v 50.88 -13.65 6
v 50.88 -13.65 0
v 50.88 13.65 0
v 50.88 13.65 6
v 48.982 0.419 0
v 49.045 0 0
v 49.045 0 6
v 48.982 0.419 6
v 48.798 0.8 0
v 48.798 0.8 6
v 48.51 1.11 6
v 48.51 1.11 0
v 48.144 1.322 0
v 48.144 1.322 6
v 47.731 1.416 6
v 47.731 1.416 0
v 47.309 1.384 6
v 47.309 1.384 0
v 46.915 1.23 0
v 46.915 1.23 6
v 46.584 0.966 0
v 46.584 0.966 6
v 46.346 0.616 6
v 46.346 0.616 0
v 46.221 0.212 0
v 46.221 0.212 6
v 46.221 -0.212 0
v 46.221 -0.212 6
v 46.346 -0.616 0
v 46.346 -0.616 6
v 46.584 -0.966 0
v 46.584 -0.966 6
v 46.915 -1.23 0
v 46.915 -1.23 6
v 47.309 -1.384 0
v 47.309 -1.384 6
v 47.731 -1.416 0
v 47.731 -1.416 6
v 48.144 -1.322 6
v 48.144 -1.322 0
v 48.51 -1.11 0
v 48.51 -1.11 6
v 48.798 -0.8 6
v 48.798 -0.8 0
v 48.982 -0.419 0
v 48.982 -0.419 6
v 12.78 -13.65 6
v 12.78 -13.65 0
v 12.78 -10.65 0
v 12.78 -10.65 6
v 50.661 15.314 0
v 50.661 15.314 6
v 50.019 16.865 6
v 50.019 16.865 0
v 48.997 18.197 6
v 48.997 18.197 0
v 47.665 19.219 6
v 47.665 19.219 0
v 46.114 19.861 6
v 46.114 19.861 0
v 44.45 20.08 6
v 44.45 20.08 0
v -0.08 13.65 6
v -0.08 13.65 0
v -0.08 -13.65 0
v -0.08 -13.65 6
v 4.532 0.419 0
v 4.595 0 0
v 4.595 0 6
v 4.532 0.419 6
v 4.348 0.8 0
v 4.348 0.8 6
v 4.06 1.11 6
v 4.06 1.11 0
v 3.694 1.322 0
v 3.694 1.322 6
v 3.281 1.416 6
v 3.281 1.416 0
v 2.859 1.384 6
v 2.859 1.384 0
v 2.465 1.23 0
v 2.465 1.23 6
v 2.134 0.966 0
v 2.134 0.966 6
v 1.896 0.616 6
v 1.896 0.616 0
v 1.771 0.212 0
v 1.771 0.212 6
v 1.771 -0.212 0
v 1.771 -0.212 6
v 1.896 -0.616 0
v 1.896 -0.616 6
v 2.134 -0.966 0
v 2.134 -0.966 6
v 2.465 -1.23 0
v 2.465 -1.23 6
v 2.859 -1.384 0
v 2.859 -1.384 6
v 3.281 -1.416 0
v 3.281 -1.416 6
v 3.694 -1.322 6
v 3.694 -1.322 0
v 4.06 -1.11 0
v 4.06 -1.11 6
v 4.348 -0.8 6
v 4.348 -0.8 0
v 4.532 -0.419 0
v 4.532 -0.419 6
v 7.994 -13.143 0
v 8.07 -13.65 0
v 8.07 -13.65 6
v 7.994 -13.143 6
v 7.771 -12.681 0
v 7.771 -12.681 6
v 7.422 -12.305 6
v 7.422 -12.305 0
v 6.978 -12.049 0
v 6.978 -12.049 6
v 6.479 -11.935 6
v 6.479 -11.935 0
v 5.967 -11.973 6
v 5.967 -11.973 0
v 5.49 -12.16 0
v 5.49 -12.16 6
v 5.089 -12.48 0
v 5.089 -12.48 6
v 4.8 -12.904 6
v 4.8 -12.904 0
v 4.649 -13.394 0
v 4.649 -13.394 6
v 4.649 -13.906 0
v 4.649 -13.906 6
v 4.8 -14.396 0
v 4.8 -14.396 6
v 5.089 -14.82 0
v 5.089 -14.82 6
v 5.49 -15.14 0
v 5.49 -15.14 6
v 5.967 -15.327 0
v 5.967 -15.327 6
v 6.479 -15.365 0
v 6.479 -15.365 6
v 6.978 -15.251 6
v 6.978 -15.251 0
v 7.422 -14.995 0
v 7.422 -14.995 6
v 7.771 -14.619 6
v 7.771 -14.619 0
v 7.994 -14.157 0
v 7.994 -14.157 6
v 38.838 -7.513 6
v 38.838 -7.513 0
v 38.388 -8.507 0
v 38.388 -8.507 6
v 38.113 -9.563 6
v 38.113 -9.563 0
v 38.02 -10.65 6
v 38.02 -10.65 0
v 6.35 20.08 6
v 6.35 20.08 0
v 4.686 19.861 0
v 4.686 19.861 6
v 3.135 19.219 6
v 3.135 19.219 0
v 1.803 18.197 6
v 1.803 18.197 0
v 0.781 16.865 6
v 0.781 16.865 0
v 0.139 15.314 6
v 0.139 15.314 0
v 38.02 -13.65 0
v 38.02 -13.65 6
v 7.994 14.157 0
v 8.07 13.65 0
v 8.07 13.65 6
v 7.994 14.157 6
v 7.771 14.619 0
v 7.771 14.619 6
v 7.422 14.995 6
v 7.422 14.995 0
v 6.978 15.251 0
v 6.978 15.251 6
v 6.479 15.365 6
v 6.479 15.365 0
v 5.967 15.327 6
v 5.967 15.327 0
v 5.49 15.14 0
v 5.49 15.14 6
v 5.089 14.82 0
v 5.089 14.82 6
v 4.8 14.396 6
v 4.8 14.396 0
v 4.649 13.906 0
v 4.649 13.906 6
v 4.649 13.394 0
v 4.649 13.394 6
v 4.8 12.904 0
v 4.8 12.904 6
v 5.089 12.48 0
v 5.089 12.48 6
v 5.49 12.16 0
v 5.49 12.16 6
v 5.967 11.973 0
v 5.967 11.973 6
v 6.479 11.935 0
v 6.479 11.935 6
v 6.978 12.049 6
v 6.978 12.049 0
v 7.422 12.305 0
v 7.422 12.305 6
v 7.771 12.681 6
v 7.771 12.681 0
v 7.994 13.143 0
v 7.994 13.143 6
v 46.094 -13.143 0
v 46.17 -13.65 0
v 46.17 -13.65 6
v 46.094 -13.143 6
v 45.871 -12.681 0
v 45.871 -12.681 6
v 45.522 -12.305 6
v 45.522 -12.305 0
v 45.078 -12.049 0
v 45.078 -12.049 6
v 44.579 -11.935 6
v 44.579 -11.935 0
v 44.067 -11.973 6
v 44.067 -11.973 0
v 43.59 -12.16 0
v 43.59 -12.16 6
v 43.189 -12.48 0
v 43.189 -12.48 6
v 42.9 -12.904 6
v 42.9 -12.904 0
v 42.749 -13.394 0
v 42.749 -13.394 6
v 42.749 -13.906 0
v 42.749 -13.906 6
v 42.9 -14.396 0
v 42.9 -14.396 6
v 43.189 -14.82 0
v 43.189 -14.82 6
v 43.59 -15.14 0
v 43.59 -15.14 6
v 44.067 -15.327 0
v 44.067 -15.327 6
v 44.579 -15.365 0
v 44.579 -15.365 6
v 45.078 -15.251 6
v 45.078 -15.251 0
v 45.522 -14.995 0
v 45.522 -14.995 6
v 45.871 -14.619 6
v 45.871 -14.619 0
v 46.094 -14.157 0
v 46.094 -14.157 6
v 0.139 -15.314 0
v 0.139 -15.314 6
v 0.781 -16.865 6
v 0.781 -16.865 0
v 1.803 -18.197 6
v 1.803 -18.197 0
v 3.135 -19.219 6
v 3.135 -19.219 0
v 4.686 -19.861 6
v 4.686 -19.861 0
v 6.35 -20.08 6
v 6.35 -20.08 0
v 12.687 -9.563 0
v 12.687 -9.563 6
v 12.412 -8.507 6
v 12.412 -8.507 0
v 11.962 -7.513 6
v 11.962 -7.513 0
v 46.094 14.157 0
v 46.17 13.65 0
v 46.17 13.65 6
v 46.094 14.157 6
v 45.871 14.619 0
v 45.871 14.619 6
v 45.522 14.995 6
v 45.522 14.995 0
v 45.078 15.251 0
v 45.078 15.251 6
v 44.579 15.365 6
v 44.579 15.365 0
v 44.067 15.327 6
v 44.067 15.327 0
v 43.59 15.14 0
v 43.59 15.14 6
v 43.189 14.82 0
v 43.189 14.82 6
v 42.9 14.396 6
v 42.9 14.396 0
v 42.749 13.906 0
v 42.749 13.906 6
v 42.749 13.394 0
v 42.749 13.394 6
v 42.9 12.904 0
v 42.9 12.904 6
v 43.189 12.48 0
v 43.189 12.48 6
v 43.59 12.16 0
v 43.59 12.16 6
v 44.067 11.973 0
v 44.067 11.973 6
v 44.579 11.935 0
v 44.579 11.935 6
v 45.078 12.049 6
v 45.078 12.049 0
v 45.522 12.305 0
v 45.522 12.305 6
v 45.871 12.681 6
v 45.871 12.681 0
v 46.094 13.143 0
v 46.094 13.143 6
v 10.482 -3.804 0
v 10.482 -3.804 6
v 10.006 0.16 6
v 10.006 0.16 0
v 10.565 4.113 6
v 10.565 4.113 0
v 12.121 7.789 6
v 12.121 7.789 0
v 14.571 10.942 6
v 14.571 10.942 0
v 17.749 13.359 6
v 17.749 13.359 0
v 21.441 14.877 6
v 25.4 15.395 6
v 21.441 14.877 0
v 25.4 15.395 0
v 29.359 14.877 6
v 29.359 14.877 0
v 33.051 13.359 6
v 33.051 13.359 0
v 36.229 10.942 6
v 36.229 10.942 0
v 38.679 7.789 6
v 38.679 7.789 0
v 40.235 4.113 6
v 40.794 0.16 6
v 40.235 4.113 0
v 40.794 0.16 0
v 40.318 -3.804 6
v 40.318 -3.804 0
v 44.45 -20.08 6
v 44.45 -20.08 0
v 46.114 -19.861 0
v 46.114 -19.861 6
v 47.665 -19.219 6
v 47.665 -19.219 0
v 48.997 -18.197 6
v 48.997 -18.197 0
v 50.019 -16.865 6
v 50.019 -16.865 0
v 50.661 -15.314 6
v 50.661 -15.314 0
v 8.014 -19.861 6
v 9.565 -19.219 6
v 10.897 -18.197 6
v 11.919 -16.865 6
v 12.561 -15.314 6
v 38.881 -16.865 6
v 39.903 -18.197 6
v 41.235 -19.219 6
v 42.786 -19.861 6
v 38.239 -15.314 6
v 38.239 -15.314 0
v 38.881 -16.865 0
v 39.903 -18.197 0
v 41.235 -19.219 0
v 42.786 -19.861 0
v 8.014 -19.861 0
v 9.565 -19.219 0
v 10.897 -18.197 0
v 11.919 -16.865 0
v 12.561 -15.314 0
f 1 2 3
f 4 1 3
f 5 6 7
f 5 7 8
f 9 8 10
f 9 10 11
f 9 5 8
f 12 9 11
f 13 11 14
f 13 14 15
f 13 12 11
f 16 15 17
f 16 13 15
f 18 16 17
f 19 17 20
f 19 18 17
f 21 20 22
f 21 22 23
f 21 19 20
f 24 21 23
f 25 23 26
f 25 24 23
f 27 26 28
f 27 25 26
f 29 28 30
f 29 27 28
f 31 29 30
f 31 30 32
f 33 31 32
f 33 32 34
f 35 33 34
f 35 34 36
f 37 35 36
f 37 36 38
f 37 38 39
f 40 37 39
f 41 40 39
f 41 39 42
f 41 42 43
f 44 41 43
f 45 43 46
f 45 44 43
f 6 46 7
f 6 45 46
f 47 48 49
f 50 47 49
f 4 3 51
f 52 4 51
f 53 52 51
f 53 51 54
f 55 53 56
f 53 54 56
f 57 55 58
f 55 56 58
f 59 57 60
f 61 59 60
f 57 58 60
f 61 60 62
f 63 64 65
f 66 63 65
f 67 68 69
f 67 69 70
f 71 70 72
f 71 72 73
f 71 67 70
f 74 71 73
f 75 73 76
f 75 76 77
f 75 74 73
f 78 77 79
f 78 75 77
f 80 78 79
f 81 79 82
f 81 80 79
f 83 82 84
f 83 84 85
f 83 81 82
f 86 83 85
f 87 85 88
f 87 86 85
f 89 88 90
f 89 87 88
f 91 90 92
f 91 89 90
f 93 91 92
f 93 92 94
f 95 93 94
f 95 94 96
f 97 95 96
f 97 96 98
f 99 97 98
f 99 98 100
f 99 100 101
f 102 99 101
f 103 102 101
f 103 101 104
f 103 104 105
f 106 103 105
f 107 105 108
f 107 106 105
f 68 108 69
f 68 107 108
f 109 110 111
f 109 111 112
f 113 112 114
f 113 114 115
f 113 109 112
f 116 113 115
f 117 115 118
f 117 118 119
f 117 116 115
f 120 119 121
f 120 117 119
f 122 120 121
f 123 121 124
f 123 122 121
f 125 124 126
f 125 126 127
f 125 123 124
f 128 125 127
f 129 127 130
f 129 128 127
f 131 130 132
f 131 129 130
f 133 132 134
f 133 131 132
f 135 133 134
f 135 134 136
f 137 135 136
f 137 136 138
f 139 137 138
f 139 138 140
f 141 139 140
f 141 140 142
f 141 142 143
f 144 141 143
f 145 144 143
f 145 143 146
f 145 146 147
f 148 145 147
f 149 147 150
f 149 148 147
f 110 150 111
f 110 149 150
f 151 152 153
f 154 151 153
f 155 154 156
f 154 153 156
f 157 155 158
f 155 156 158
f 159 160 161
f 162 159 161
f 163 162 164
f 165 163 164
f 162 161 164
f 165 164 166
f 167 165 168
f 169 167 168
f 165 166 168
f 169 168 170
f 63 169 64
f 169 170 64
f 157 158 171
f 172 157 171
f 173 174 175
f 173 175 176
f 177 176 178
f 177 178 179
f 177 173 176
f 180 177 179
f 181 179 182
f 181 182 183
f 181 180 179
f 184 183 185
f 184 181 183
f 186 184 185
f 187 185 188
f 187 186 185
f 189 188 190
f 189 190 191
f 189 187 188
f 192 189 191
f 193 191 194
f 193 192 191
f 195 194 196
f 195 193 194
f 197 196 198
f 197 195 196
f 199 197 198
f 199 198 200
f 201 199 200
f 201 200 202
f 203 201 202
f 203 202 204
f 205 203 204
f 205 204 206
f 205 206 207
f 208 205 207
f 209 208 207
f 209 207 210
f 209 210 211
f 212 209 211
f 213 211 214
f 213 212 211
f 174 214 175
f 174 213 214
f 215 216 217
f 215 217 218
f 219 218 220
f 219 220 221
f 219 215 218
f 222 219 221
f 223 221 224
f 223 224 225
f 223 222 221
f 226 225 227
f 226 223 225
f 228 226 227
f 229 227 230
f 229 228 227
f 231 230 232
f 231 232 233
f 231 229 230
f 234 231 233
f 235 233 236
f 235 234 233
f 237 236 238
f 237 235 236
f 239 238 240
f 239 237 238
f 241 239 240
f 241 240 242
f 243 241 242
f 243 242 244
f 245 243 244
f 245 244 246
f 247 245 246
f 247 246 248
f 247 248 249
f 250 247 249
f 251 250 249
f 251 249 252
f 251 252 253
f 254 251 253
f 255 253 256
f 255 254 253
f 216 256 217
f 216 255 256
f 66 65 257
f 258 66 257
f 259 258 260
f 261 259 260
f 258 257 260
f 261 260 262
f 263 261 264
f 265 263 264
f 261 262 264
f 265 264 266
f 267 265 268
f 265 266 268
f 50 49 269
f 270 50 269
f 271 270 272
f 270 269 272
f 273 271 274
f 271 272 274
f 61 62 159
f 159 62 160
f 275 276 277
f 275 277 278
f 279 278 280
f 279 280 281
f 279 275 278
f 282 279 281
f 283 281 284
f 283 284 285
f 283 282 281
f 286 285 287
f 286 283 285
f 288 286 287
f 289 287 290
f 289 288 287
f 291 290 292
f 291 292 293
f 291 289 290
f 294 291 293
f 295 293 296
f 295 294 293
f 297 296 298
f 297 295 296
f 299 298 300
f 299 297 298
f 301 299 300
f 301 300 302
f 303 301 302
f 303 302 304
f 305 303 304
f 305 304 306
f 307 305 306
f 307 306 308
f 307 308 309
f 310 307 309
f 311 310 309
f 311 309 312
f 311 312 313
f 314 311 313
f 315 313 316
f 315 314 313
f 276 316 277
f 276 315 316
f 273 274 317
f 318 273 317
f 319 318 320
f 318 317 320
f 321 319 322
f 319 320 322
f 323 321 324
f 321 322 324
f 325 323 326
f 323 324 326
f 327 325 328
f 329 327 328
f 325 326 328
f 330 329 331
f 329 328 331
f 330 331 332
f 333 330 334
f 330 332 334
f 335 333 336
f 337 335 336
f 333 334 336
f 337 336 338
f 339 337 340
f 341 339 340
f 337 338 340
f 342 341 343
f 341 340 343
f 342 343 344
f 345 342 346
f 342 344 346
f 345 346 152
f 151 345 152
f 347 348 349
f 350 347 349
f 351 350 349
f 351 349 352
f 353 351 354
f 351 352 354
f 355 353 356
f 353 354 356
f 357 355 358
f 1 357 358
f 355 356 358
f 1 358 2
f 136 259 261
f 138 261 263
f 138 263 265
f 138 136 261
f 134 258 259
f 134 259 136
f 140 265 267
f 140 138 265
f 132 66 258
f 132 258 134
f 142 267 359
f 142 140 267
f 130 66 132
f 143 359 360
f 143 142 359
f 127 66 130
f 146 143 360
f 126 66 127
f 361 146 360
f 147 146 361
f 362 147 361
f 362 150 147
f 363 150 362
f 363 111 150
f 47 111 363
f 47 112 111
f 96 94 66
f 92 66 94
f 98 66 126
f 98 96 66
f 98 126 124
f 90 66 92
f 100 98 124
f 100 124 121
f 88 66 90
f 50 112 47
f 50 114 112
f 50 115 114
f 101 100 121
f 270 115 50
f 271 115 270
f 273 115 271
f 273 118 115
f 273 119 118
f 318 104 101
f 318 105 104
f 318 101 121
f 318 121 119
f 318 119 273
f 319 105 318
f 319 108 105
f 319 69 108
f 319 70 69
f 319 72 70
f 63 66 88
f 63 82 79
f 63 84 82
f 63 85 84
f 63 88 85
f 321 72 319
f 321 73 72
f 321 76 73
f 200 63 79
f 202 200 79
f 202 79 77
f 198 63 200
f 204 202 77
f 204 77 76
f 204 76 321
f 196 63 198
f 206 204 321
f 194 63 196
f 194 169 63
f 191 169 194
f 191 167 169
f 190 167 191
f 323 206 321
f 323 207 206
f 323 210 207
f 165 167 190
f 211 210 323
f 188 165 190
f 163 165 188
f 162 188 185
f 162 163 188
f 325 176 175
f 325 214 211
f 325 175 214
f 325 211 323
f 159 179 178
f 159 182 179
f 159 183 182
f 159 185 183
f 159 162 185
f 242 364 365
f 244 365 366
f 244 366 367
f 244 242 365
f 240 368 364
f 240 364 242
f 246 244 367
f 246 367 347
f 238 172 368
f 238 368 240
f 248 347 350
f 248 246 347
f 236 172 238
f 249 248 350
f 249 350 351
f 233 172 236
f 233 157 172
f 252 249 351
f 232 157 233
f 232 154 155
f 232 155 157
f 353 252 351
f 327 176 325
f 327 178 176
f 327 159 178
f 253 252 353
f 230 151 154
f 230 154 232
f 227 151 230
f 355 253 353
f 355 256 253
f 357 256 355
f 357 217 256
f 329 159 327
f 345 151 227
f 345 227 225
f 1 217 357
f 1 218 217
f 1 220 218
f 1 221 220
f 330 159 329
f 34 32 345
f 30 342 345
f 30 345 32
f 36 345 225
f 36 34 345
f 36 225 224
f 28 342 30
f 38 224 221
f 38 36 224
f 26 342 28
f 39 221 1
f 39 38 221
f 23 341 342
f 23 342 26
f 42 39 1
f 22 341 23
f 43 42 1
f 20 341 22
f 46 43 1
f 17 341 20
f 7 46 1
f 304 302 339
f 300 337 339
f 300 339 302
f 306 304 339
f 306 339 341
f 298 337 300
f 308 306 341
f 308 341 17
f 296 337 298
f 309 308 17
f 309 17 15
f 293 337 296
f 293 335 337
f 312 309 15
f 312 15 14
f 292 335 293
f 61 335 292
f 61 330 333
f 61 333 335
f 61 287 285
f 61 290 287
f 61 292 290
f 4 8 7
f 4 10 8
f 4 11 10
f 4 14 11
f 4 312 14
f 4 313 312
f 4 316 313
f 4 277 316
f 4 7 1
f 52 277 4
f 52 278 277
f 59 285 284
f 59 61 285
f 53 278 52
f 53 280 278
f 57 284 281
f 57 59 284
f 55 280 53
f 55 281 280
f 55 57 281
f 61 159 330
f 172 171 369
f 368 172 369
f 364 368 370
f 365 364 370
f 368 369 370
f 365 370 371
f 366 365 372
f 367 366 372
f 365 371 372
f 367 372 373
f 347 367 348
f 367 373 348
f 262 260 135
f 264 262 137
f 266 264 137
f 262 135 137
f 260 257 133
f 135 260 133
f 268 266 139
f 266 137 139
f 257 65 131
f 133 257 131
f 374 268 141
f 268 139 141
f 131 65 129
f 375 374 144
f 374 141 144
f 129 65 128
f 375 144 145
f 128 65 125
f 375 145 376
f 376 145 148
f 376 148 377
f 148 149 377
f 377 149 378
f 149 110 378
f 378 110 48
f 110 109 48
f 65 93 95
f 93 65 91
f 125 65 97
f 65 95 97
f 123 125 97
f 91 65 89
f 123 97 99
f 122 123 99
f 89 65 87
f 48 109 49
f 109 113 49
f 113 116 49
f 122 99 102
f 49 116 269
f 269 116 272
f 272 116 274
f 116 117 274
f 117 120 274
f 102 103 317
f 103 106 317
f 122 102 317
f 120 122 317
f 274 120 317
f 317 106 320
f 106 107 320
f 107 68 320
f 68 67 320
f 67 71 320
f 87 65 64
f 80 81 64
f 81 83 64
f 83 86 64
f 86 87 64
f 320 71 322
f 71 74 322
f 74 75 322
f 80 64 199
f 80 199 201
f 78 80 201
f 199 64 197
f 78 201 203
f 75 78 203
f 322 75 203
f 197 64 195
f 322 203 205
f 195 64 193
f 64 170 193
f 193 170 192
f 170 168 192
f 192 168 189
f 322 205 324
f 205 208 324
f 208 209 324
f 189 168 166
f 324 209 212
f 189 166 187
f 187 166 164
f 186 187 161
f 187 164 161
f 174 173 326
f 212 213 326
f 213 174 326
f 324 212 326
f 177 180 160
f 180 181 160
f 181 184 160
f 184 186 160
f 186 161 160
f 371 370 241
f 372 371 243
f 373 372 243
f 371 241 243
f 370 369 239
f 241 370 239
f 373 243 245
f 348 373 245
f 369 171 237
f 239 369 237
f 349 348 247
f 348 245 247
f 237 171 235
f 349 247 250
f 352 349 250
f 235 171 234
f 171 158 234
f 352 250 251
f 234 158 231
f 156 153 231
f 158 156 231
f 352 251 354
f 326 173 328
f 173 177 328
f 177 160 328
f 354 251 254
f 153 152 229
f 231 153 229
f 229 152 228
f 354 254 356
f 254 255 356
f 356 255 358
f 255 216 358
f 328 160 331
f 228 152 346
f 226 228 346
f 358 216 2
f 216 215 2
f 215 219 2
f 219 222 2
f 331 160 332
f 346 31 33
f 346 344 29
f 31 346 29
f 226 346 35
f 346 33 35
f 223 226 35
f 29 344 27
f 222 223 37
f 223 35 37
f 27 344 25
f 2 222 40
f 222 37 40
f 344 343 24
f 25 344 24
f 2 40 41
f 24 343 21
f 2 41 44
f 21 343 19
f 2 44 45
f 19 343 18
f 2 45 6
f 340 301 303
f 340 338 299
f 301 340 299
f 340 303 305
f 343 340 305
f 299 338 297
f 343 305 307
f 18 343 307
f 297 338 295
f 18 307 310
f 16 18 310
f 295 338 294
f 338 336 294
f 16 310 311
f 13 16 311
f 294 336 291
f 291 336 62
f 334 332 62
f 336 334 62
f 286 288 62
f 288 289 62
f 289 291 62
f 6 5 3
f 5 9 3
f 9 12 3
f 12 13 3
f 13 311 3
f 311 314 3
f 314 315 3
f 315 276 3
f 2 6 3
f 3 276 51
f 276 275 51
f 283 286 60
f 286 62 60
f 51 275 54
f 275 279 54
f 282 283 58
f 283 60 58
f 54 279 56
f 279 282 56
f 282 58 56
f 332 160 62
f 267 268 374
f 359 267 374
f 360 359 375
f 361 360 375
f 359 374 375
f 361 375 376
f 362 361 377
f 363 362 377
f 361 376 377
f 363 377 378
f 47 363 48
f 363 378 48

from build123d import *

# Parameters (mm, degrees)
SKETCH1_W              = 50.8
SKETCH1_H              = 40
BOSS_EXTRUDE1_DEPTH    = 6
SKETCH10_R             = 1.8
M3_THROUGH_DEPTH       = 55.923947418
CUT_EXTRUDE2_DEPTH     = 55.923947418
FILLET1_R              = 6.35
SKETCH8_R              = 1.5
CUT_EXTRUDE1_DEPTH     = 55.923947418
MOVE_FACE1_OUTLINE_R   = 1.8
MOVE_FACE1_OUTLINE_R_2 = 1.72
MOVE_FACE1_OUTLINE_R_3 = 1.5
MOVE_FACE1_OUTLINE_R_4 = 1.42
MOVE_FACE1_DEPTH       = 6


# Read off the part's stored shape, not the designer's step: Move Face1
with BuildPart() as part:
    # Sketch1 → Boss-Extrude1 (new body)
    with BuildSketch(Plane.XY):
        with Locations((25.4, 0)):
            Rectangle(SKETCH1_W, SKETCH1_H)
    extrude(amount=BOSS_EXTRUDE1_DEPTH)

    # Sketch10 → M3-through (cut, through all)
    with BuildSketch(Plane.XY.offset(6)):
        with Locations((44.45, 13.65)):
            Circle(SKETCH10_R)
        with Locations(Location((44.45, -13.65, 0), (0, 0, 180))):
            Circle(SKETCH10_R)
        with Locations((6.35, -13.65)):
            Circle(SKETCH10_R)
        with Locations(Location((6.35, 13.65, 0), (0, 0, 180))):
            Circle(SKETCH10_R)
    extrude(amount=-M3_THROUGH_DEPTH, mode=Mode.SUBTRACT)

    # Sketch9 → Cut-Extrude2 (cut, through all)
    with BuildSketch(Plane.XY.offset(6)):
        with BuildLine():
            Line((12.7, -8.842263568), (12.7, -20))
            Line((12.7, -20), (38.1, -20))
            Line((38.1, -20), (38.1, -8.842263568))
            ThreePointArc((38.1, -8.842263568), (25.4, 15.475), (12.7, -8.842263568))
        make_face()
    extrude(amount=-CUT_EXTRUDE2_DEPTH, mode=Mode.SUBTRACT)

    # Fillet1
    fillet1_edges = [part.edges().sort_by_distance(p)[0] for p in [
        (0, -20, 3),
        (50.8, -20, 3),
        (50.8, 20, 3),
        (0, 20, 3),
        (38.1, -20, 3),
        (38.1, -8.842263568, 3),
        (12.7, -8.842263568, 3),
        (12.7, -20, 3),
    ]]
    fillet(fillet1_edges, radius=FILLET1_R - 0.0001)  # a hair under: the kernel refuses the full size

    # Sketch8 → Cut-Extrude1 (cut, through all)
    with BuildSketch(Plane.XY.offset(6)):
        with Locations((47.625, 0)):
            Circle(SKETCH8_R)
        with Locations((3.175, 0)):
            Circle(SKETCH8_R)
    extrude(amount=-CUT_EXTRUDE1_DEPTH, mode=Mode.SUBTRACT)

    # Move Face1 outline → Move Face1 (add)
    # profile 1 of 7: a face of its own
    with BuildSketch(Plane.XY):
        with BuildLine():
            Line((-0.08, 13.65), (-0.08, -13.65))
            ThreePointArc((-0.08, -13.65), (1.803303397, -18.196696603), (6.35, -20.08))
            ThreePointArc((6.35, -20.08), (10.896696603, -18.196696603), (12.78, -13.65))
            Line((12.78, -13.65), (12.78, -10.650264081))
            ThreePointArc((12.78, -10.650264081), (12.572253945, -9.029012761), (11.962439863, -7.512523048))
            ThreePointArc((11.962439863, -7.512523048), (25.4, 15.395), (38.837560137, -7.512523048))
            ThreePointArc((38.837560137, -7.512523048), (38.227746055, -9.029012761), (38.02, -10.650264081))
            Line((38.02, -10.650264081), (38.02, -13.65))
            ThreePointArc((38.02, -13.65), (39.903303397, -18.196696603), (44.45, -20.08))
            ThreePointArc((44.45, -20.08), (48.996696603, -18.196696603), (50.88, -13.65))
            Line((50.88, -13.65), (50.88, 13.65))
            ThreePointArc((50.88, 13.65), (48.996696603, 18.196696603), (44.45, 20.08))
            Line((44.45, 20.08), (6.35, 20.08))
            ThreePointArc((6.35, 20.08), (1.803303397, 18.196696603), (-0.08, 13.65))
        make_face()
        with BuildLine():
            ThreePointArc((6.35, -20), (1.859871939, -18.140128061), (0, -13.65))
            Line((0, -13.65), (0, 13.65))
            ThreePointArc((0, 13.65), (1.859871939, 18.140128061), (6.35, 20))
            Line((6.35, 20), (44.45, 20))
            ThreePointArc((44.45, 20), (48.940128061, 18.140128061), (50.8, 13.65))
            Line((50.8, 13.65), (50.8, -13.65))
            ThreePointArc((50.8, -13.65), (48.940128061, -18.140128061), (44.45, -20))
            ThreePointArc((44.45, -20), (39.959871939, -18.140128061), (38.1, -13.65))
            Line((38.1, -13.65), (38.1, -10.650264081))
            ThreePointArc((38.1, -10.650264081), (38.305161345, -9.049183851), (38.907388316, -7.551561817))
            ThreePointArc((38.907388316, -7.551561817), (25.4, 15.475), (11.892611684, -7.551561817))
            ThreePointArc((11.892611684, -7.551561817), (12.494838655, -9.049183851), (12.7, -10.650264081))
            Line((12.7, -10.650264081), (12.7, -13.65))
            ThreePointArc((12.7, -13.65), (10.840128061, -18.140128061), (6.35, -20))
        make_face(mode=Mode.SUBTRACT)
    # profile 2 of 7: a face of its own
    with BuildSketch(Plane.XY):
        with Locations((44.45, 13.65)):
            Circle(MOVE_FACE1_OUTLINE_R)
        with Locations((44.45, 13.65)):
            Circle(MOVE_FACE1_OUTLINE_R_2, mode=Mode.SUBTRACT)
    # profile 3 of 7: a face of its own
    with BuildSketch(Plane.XY):
        with Locations((44.45, -13.65)):
            Circle(MOVE_FACE1_OUTLINE_R)
        with Locations((44.45, -13.65)):
            Circle(MOVE_FACE1_OUTLINE_R_2, mode=Mode.SUBTRACT)
    # profile 4 of 7: a face of its own
    with BuildSketch(Plane.XY):
        with Locations((6.35, -13.65)):
            Circle(MOVE_FACE1_OUTLINE_R)
        with Locations((6.35, -13.65)):
            Circle(MOVE_FACE1_OUTLINE_R_2, mode=Mode.SUBTRACT)
    # profile 5 of 7: a face of its own
    with BuildSketch(Plane.XY):
        with Locations((6.35, 13.65)):
            Circle(MOVE_FACE1_OUTLINE_R)
        with Locations((6.35, 13.65)):
            Circle(MOVE_FACE1_OUTLINE_R_2, mode=Mode.SUBTRACT)
    # profile 6 of 7: a face of its own
    with BuildSketch(Plane.XY):
        with Locations((47.625, 0)):
            Circle(MOVE_FACE1_OUTLINE_R_3)
        with Locations((47.625, 0)):
            Circle(MOVE_FACE1_OUTLINE_R_4, mode=Mode.SUBTRACT)
    # profile 7 of 7: a face of its own
    with BuildSketch(Plane.XY):
        with Locations((3.175, 0)):
            Circle(MOVE_FACE1_OUTLINE_R_3)
        with Locations((3.175, 0)):
            Circle(MOVE_FACE1_OUTLINE_R_4, mode=Mode.SUBTRACT)
    extrude(amount=MOVE_FACE1_DEPTH)


solid = part.part
